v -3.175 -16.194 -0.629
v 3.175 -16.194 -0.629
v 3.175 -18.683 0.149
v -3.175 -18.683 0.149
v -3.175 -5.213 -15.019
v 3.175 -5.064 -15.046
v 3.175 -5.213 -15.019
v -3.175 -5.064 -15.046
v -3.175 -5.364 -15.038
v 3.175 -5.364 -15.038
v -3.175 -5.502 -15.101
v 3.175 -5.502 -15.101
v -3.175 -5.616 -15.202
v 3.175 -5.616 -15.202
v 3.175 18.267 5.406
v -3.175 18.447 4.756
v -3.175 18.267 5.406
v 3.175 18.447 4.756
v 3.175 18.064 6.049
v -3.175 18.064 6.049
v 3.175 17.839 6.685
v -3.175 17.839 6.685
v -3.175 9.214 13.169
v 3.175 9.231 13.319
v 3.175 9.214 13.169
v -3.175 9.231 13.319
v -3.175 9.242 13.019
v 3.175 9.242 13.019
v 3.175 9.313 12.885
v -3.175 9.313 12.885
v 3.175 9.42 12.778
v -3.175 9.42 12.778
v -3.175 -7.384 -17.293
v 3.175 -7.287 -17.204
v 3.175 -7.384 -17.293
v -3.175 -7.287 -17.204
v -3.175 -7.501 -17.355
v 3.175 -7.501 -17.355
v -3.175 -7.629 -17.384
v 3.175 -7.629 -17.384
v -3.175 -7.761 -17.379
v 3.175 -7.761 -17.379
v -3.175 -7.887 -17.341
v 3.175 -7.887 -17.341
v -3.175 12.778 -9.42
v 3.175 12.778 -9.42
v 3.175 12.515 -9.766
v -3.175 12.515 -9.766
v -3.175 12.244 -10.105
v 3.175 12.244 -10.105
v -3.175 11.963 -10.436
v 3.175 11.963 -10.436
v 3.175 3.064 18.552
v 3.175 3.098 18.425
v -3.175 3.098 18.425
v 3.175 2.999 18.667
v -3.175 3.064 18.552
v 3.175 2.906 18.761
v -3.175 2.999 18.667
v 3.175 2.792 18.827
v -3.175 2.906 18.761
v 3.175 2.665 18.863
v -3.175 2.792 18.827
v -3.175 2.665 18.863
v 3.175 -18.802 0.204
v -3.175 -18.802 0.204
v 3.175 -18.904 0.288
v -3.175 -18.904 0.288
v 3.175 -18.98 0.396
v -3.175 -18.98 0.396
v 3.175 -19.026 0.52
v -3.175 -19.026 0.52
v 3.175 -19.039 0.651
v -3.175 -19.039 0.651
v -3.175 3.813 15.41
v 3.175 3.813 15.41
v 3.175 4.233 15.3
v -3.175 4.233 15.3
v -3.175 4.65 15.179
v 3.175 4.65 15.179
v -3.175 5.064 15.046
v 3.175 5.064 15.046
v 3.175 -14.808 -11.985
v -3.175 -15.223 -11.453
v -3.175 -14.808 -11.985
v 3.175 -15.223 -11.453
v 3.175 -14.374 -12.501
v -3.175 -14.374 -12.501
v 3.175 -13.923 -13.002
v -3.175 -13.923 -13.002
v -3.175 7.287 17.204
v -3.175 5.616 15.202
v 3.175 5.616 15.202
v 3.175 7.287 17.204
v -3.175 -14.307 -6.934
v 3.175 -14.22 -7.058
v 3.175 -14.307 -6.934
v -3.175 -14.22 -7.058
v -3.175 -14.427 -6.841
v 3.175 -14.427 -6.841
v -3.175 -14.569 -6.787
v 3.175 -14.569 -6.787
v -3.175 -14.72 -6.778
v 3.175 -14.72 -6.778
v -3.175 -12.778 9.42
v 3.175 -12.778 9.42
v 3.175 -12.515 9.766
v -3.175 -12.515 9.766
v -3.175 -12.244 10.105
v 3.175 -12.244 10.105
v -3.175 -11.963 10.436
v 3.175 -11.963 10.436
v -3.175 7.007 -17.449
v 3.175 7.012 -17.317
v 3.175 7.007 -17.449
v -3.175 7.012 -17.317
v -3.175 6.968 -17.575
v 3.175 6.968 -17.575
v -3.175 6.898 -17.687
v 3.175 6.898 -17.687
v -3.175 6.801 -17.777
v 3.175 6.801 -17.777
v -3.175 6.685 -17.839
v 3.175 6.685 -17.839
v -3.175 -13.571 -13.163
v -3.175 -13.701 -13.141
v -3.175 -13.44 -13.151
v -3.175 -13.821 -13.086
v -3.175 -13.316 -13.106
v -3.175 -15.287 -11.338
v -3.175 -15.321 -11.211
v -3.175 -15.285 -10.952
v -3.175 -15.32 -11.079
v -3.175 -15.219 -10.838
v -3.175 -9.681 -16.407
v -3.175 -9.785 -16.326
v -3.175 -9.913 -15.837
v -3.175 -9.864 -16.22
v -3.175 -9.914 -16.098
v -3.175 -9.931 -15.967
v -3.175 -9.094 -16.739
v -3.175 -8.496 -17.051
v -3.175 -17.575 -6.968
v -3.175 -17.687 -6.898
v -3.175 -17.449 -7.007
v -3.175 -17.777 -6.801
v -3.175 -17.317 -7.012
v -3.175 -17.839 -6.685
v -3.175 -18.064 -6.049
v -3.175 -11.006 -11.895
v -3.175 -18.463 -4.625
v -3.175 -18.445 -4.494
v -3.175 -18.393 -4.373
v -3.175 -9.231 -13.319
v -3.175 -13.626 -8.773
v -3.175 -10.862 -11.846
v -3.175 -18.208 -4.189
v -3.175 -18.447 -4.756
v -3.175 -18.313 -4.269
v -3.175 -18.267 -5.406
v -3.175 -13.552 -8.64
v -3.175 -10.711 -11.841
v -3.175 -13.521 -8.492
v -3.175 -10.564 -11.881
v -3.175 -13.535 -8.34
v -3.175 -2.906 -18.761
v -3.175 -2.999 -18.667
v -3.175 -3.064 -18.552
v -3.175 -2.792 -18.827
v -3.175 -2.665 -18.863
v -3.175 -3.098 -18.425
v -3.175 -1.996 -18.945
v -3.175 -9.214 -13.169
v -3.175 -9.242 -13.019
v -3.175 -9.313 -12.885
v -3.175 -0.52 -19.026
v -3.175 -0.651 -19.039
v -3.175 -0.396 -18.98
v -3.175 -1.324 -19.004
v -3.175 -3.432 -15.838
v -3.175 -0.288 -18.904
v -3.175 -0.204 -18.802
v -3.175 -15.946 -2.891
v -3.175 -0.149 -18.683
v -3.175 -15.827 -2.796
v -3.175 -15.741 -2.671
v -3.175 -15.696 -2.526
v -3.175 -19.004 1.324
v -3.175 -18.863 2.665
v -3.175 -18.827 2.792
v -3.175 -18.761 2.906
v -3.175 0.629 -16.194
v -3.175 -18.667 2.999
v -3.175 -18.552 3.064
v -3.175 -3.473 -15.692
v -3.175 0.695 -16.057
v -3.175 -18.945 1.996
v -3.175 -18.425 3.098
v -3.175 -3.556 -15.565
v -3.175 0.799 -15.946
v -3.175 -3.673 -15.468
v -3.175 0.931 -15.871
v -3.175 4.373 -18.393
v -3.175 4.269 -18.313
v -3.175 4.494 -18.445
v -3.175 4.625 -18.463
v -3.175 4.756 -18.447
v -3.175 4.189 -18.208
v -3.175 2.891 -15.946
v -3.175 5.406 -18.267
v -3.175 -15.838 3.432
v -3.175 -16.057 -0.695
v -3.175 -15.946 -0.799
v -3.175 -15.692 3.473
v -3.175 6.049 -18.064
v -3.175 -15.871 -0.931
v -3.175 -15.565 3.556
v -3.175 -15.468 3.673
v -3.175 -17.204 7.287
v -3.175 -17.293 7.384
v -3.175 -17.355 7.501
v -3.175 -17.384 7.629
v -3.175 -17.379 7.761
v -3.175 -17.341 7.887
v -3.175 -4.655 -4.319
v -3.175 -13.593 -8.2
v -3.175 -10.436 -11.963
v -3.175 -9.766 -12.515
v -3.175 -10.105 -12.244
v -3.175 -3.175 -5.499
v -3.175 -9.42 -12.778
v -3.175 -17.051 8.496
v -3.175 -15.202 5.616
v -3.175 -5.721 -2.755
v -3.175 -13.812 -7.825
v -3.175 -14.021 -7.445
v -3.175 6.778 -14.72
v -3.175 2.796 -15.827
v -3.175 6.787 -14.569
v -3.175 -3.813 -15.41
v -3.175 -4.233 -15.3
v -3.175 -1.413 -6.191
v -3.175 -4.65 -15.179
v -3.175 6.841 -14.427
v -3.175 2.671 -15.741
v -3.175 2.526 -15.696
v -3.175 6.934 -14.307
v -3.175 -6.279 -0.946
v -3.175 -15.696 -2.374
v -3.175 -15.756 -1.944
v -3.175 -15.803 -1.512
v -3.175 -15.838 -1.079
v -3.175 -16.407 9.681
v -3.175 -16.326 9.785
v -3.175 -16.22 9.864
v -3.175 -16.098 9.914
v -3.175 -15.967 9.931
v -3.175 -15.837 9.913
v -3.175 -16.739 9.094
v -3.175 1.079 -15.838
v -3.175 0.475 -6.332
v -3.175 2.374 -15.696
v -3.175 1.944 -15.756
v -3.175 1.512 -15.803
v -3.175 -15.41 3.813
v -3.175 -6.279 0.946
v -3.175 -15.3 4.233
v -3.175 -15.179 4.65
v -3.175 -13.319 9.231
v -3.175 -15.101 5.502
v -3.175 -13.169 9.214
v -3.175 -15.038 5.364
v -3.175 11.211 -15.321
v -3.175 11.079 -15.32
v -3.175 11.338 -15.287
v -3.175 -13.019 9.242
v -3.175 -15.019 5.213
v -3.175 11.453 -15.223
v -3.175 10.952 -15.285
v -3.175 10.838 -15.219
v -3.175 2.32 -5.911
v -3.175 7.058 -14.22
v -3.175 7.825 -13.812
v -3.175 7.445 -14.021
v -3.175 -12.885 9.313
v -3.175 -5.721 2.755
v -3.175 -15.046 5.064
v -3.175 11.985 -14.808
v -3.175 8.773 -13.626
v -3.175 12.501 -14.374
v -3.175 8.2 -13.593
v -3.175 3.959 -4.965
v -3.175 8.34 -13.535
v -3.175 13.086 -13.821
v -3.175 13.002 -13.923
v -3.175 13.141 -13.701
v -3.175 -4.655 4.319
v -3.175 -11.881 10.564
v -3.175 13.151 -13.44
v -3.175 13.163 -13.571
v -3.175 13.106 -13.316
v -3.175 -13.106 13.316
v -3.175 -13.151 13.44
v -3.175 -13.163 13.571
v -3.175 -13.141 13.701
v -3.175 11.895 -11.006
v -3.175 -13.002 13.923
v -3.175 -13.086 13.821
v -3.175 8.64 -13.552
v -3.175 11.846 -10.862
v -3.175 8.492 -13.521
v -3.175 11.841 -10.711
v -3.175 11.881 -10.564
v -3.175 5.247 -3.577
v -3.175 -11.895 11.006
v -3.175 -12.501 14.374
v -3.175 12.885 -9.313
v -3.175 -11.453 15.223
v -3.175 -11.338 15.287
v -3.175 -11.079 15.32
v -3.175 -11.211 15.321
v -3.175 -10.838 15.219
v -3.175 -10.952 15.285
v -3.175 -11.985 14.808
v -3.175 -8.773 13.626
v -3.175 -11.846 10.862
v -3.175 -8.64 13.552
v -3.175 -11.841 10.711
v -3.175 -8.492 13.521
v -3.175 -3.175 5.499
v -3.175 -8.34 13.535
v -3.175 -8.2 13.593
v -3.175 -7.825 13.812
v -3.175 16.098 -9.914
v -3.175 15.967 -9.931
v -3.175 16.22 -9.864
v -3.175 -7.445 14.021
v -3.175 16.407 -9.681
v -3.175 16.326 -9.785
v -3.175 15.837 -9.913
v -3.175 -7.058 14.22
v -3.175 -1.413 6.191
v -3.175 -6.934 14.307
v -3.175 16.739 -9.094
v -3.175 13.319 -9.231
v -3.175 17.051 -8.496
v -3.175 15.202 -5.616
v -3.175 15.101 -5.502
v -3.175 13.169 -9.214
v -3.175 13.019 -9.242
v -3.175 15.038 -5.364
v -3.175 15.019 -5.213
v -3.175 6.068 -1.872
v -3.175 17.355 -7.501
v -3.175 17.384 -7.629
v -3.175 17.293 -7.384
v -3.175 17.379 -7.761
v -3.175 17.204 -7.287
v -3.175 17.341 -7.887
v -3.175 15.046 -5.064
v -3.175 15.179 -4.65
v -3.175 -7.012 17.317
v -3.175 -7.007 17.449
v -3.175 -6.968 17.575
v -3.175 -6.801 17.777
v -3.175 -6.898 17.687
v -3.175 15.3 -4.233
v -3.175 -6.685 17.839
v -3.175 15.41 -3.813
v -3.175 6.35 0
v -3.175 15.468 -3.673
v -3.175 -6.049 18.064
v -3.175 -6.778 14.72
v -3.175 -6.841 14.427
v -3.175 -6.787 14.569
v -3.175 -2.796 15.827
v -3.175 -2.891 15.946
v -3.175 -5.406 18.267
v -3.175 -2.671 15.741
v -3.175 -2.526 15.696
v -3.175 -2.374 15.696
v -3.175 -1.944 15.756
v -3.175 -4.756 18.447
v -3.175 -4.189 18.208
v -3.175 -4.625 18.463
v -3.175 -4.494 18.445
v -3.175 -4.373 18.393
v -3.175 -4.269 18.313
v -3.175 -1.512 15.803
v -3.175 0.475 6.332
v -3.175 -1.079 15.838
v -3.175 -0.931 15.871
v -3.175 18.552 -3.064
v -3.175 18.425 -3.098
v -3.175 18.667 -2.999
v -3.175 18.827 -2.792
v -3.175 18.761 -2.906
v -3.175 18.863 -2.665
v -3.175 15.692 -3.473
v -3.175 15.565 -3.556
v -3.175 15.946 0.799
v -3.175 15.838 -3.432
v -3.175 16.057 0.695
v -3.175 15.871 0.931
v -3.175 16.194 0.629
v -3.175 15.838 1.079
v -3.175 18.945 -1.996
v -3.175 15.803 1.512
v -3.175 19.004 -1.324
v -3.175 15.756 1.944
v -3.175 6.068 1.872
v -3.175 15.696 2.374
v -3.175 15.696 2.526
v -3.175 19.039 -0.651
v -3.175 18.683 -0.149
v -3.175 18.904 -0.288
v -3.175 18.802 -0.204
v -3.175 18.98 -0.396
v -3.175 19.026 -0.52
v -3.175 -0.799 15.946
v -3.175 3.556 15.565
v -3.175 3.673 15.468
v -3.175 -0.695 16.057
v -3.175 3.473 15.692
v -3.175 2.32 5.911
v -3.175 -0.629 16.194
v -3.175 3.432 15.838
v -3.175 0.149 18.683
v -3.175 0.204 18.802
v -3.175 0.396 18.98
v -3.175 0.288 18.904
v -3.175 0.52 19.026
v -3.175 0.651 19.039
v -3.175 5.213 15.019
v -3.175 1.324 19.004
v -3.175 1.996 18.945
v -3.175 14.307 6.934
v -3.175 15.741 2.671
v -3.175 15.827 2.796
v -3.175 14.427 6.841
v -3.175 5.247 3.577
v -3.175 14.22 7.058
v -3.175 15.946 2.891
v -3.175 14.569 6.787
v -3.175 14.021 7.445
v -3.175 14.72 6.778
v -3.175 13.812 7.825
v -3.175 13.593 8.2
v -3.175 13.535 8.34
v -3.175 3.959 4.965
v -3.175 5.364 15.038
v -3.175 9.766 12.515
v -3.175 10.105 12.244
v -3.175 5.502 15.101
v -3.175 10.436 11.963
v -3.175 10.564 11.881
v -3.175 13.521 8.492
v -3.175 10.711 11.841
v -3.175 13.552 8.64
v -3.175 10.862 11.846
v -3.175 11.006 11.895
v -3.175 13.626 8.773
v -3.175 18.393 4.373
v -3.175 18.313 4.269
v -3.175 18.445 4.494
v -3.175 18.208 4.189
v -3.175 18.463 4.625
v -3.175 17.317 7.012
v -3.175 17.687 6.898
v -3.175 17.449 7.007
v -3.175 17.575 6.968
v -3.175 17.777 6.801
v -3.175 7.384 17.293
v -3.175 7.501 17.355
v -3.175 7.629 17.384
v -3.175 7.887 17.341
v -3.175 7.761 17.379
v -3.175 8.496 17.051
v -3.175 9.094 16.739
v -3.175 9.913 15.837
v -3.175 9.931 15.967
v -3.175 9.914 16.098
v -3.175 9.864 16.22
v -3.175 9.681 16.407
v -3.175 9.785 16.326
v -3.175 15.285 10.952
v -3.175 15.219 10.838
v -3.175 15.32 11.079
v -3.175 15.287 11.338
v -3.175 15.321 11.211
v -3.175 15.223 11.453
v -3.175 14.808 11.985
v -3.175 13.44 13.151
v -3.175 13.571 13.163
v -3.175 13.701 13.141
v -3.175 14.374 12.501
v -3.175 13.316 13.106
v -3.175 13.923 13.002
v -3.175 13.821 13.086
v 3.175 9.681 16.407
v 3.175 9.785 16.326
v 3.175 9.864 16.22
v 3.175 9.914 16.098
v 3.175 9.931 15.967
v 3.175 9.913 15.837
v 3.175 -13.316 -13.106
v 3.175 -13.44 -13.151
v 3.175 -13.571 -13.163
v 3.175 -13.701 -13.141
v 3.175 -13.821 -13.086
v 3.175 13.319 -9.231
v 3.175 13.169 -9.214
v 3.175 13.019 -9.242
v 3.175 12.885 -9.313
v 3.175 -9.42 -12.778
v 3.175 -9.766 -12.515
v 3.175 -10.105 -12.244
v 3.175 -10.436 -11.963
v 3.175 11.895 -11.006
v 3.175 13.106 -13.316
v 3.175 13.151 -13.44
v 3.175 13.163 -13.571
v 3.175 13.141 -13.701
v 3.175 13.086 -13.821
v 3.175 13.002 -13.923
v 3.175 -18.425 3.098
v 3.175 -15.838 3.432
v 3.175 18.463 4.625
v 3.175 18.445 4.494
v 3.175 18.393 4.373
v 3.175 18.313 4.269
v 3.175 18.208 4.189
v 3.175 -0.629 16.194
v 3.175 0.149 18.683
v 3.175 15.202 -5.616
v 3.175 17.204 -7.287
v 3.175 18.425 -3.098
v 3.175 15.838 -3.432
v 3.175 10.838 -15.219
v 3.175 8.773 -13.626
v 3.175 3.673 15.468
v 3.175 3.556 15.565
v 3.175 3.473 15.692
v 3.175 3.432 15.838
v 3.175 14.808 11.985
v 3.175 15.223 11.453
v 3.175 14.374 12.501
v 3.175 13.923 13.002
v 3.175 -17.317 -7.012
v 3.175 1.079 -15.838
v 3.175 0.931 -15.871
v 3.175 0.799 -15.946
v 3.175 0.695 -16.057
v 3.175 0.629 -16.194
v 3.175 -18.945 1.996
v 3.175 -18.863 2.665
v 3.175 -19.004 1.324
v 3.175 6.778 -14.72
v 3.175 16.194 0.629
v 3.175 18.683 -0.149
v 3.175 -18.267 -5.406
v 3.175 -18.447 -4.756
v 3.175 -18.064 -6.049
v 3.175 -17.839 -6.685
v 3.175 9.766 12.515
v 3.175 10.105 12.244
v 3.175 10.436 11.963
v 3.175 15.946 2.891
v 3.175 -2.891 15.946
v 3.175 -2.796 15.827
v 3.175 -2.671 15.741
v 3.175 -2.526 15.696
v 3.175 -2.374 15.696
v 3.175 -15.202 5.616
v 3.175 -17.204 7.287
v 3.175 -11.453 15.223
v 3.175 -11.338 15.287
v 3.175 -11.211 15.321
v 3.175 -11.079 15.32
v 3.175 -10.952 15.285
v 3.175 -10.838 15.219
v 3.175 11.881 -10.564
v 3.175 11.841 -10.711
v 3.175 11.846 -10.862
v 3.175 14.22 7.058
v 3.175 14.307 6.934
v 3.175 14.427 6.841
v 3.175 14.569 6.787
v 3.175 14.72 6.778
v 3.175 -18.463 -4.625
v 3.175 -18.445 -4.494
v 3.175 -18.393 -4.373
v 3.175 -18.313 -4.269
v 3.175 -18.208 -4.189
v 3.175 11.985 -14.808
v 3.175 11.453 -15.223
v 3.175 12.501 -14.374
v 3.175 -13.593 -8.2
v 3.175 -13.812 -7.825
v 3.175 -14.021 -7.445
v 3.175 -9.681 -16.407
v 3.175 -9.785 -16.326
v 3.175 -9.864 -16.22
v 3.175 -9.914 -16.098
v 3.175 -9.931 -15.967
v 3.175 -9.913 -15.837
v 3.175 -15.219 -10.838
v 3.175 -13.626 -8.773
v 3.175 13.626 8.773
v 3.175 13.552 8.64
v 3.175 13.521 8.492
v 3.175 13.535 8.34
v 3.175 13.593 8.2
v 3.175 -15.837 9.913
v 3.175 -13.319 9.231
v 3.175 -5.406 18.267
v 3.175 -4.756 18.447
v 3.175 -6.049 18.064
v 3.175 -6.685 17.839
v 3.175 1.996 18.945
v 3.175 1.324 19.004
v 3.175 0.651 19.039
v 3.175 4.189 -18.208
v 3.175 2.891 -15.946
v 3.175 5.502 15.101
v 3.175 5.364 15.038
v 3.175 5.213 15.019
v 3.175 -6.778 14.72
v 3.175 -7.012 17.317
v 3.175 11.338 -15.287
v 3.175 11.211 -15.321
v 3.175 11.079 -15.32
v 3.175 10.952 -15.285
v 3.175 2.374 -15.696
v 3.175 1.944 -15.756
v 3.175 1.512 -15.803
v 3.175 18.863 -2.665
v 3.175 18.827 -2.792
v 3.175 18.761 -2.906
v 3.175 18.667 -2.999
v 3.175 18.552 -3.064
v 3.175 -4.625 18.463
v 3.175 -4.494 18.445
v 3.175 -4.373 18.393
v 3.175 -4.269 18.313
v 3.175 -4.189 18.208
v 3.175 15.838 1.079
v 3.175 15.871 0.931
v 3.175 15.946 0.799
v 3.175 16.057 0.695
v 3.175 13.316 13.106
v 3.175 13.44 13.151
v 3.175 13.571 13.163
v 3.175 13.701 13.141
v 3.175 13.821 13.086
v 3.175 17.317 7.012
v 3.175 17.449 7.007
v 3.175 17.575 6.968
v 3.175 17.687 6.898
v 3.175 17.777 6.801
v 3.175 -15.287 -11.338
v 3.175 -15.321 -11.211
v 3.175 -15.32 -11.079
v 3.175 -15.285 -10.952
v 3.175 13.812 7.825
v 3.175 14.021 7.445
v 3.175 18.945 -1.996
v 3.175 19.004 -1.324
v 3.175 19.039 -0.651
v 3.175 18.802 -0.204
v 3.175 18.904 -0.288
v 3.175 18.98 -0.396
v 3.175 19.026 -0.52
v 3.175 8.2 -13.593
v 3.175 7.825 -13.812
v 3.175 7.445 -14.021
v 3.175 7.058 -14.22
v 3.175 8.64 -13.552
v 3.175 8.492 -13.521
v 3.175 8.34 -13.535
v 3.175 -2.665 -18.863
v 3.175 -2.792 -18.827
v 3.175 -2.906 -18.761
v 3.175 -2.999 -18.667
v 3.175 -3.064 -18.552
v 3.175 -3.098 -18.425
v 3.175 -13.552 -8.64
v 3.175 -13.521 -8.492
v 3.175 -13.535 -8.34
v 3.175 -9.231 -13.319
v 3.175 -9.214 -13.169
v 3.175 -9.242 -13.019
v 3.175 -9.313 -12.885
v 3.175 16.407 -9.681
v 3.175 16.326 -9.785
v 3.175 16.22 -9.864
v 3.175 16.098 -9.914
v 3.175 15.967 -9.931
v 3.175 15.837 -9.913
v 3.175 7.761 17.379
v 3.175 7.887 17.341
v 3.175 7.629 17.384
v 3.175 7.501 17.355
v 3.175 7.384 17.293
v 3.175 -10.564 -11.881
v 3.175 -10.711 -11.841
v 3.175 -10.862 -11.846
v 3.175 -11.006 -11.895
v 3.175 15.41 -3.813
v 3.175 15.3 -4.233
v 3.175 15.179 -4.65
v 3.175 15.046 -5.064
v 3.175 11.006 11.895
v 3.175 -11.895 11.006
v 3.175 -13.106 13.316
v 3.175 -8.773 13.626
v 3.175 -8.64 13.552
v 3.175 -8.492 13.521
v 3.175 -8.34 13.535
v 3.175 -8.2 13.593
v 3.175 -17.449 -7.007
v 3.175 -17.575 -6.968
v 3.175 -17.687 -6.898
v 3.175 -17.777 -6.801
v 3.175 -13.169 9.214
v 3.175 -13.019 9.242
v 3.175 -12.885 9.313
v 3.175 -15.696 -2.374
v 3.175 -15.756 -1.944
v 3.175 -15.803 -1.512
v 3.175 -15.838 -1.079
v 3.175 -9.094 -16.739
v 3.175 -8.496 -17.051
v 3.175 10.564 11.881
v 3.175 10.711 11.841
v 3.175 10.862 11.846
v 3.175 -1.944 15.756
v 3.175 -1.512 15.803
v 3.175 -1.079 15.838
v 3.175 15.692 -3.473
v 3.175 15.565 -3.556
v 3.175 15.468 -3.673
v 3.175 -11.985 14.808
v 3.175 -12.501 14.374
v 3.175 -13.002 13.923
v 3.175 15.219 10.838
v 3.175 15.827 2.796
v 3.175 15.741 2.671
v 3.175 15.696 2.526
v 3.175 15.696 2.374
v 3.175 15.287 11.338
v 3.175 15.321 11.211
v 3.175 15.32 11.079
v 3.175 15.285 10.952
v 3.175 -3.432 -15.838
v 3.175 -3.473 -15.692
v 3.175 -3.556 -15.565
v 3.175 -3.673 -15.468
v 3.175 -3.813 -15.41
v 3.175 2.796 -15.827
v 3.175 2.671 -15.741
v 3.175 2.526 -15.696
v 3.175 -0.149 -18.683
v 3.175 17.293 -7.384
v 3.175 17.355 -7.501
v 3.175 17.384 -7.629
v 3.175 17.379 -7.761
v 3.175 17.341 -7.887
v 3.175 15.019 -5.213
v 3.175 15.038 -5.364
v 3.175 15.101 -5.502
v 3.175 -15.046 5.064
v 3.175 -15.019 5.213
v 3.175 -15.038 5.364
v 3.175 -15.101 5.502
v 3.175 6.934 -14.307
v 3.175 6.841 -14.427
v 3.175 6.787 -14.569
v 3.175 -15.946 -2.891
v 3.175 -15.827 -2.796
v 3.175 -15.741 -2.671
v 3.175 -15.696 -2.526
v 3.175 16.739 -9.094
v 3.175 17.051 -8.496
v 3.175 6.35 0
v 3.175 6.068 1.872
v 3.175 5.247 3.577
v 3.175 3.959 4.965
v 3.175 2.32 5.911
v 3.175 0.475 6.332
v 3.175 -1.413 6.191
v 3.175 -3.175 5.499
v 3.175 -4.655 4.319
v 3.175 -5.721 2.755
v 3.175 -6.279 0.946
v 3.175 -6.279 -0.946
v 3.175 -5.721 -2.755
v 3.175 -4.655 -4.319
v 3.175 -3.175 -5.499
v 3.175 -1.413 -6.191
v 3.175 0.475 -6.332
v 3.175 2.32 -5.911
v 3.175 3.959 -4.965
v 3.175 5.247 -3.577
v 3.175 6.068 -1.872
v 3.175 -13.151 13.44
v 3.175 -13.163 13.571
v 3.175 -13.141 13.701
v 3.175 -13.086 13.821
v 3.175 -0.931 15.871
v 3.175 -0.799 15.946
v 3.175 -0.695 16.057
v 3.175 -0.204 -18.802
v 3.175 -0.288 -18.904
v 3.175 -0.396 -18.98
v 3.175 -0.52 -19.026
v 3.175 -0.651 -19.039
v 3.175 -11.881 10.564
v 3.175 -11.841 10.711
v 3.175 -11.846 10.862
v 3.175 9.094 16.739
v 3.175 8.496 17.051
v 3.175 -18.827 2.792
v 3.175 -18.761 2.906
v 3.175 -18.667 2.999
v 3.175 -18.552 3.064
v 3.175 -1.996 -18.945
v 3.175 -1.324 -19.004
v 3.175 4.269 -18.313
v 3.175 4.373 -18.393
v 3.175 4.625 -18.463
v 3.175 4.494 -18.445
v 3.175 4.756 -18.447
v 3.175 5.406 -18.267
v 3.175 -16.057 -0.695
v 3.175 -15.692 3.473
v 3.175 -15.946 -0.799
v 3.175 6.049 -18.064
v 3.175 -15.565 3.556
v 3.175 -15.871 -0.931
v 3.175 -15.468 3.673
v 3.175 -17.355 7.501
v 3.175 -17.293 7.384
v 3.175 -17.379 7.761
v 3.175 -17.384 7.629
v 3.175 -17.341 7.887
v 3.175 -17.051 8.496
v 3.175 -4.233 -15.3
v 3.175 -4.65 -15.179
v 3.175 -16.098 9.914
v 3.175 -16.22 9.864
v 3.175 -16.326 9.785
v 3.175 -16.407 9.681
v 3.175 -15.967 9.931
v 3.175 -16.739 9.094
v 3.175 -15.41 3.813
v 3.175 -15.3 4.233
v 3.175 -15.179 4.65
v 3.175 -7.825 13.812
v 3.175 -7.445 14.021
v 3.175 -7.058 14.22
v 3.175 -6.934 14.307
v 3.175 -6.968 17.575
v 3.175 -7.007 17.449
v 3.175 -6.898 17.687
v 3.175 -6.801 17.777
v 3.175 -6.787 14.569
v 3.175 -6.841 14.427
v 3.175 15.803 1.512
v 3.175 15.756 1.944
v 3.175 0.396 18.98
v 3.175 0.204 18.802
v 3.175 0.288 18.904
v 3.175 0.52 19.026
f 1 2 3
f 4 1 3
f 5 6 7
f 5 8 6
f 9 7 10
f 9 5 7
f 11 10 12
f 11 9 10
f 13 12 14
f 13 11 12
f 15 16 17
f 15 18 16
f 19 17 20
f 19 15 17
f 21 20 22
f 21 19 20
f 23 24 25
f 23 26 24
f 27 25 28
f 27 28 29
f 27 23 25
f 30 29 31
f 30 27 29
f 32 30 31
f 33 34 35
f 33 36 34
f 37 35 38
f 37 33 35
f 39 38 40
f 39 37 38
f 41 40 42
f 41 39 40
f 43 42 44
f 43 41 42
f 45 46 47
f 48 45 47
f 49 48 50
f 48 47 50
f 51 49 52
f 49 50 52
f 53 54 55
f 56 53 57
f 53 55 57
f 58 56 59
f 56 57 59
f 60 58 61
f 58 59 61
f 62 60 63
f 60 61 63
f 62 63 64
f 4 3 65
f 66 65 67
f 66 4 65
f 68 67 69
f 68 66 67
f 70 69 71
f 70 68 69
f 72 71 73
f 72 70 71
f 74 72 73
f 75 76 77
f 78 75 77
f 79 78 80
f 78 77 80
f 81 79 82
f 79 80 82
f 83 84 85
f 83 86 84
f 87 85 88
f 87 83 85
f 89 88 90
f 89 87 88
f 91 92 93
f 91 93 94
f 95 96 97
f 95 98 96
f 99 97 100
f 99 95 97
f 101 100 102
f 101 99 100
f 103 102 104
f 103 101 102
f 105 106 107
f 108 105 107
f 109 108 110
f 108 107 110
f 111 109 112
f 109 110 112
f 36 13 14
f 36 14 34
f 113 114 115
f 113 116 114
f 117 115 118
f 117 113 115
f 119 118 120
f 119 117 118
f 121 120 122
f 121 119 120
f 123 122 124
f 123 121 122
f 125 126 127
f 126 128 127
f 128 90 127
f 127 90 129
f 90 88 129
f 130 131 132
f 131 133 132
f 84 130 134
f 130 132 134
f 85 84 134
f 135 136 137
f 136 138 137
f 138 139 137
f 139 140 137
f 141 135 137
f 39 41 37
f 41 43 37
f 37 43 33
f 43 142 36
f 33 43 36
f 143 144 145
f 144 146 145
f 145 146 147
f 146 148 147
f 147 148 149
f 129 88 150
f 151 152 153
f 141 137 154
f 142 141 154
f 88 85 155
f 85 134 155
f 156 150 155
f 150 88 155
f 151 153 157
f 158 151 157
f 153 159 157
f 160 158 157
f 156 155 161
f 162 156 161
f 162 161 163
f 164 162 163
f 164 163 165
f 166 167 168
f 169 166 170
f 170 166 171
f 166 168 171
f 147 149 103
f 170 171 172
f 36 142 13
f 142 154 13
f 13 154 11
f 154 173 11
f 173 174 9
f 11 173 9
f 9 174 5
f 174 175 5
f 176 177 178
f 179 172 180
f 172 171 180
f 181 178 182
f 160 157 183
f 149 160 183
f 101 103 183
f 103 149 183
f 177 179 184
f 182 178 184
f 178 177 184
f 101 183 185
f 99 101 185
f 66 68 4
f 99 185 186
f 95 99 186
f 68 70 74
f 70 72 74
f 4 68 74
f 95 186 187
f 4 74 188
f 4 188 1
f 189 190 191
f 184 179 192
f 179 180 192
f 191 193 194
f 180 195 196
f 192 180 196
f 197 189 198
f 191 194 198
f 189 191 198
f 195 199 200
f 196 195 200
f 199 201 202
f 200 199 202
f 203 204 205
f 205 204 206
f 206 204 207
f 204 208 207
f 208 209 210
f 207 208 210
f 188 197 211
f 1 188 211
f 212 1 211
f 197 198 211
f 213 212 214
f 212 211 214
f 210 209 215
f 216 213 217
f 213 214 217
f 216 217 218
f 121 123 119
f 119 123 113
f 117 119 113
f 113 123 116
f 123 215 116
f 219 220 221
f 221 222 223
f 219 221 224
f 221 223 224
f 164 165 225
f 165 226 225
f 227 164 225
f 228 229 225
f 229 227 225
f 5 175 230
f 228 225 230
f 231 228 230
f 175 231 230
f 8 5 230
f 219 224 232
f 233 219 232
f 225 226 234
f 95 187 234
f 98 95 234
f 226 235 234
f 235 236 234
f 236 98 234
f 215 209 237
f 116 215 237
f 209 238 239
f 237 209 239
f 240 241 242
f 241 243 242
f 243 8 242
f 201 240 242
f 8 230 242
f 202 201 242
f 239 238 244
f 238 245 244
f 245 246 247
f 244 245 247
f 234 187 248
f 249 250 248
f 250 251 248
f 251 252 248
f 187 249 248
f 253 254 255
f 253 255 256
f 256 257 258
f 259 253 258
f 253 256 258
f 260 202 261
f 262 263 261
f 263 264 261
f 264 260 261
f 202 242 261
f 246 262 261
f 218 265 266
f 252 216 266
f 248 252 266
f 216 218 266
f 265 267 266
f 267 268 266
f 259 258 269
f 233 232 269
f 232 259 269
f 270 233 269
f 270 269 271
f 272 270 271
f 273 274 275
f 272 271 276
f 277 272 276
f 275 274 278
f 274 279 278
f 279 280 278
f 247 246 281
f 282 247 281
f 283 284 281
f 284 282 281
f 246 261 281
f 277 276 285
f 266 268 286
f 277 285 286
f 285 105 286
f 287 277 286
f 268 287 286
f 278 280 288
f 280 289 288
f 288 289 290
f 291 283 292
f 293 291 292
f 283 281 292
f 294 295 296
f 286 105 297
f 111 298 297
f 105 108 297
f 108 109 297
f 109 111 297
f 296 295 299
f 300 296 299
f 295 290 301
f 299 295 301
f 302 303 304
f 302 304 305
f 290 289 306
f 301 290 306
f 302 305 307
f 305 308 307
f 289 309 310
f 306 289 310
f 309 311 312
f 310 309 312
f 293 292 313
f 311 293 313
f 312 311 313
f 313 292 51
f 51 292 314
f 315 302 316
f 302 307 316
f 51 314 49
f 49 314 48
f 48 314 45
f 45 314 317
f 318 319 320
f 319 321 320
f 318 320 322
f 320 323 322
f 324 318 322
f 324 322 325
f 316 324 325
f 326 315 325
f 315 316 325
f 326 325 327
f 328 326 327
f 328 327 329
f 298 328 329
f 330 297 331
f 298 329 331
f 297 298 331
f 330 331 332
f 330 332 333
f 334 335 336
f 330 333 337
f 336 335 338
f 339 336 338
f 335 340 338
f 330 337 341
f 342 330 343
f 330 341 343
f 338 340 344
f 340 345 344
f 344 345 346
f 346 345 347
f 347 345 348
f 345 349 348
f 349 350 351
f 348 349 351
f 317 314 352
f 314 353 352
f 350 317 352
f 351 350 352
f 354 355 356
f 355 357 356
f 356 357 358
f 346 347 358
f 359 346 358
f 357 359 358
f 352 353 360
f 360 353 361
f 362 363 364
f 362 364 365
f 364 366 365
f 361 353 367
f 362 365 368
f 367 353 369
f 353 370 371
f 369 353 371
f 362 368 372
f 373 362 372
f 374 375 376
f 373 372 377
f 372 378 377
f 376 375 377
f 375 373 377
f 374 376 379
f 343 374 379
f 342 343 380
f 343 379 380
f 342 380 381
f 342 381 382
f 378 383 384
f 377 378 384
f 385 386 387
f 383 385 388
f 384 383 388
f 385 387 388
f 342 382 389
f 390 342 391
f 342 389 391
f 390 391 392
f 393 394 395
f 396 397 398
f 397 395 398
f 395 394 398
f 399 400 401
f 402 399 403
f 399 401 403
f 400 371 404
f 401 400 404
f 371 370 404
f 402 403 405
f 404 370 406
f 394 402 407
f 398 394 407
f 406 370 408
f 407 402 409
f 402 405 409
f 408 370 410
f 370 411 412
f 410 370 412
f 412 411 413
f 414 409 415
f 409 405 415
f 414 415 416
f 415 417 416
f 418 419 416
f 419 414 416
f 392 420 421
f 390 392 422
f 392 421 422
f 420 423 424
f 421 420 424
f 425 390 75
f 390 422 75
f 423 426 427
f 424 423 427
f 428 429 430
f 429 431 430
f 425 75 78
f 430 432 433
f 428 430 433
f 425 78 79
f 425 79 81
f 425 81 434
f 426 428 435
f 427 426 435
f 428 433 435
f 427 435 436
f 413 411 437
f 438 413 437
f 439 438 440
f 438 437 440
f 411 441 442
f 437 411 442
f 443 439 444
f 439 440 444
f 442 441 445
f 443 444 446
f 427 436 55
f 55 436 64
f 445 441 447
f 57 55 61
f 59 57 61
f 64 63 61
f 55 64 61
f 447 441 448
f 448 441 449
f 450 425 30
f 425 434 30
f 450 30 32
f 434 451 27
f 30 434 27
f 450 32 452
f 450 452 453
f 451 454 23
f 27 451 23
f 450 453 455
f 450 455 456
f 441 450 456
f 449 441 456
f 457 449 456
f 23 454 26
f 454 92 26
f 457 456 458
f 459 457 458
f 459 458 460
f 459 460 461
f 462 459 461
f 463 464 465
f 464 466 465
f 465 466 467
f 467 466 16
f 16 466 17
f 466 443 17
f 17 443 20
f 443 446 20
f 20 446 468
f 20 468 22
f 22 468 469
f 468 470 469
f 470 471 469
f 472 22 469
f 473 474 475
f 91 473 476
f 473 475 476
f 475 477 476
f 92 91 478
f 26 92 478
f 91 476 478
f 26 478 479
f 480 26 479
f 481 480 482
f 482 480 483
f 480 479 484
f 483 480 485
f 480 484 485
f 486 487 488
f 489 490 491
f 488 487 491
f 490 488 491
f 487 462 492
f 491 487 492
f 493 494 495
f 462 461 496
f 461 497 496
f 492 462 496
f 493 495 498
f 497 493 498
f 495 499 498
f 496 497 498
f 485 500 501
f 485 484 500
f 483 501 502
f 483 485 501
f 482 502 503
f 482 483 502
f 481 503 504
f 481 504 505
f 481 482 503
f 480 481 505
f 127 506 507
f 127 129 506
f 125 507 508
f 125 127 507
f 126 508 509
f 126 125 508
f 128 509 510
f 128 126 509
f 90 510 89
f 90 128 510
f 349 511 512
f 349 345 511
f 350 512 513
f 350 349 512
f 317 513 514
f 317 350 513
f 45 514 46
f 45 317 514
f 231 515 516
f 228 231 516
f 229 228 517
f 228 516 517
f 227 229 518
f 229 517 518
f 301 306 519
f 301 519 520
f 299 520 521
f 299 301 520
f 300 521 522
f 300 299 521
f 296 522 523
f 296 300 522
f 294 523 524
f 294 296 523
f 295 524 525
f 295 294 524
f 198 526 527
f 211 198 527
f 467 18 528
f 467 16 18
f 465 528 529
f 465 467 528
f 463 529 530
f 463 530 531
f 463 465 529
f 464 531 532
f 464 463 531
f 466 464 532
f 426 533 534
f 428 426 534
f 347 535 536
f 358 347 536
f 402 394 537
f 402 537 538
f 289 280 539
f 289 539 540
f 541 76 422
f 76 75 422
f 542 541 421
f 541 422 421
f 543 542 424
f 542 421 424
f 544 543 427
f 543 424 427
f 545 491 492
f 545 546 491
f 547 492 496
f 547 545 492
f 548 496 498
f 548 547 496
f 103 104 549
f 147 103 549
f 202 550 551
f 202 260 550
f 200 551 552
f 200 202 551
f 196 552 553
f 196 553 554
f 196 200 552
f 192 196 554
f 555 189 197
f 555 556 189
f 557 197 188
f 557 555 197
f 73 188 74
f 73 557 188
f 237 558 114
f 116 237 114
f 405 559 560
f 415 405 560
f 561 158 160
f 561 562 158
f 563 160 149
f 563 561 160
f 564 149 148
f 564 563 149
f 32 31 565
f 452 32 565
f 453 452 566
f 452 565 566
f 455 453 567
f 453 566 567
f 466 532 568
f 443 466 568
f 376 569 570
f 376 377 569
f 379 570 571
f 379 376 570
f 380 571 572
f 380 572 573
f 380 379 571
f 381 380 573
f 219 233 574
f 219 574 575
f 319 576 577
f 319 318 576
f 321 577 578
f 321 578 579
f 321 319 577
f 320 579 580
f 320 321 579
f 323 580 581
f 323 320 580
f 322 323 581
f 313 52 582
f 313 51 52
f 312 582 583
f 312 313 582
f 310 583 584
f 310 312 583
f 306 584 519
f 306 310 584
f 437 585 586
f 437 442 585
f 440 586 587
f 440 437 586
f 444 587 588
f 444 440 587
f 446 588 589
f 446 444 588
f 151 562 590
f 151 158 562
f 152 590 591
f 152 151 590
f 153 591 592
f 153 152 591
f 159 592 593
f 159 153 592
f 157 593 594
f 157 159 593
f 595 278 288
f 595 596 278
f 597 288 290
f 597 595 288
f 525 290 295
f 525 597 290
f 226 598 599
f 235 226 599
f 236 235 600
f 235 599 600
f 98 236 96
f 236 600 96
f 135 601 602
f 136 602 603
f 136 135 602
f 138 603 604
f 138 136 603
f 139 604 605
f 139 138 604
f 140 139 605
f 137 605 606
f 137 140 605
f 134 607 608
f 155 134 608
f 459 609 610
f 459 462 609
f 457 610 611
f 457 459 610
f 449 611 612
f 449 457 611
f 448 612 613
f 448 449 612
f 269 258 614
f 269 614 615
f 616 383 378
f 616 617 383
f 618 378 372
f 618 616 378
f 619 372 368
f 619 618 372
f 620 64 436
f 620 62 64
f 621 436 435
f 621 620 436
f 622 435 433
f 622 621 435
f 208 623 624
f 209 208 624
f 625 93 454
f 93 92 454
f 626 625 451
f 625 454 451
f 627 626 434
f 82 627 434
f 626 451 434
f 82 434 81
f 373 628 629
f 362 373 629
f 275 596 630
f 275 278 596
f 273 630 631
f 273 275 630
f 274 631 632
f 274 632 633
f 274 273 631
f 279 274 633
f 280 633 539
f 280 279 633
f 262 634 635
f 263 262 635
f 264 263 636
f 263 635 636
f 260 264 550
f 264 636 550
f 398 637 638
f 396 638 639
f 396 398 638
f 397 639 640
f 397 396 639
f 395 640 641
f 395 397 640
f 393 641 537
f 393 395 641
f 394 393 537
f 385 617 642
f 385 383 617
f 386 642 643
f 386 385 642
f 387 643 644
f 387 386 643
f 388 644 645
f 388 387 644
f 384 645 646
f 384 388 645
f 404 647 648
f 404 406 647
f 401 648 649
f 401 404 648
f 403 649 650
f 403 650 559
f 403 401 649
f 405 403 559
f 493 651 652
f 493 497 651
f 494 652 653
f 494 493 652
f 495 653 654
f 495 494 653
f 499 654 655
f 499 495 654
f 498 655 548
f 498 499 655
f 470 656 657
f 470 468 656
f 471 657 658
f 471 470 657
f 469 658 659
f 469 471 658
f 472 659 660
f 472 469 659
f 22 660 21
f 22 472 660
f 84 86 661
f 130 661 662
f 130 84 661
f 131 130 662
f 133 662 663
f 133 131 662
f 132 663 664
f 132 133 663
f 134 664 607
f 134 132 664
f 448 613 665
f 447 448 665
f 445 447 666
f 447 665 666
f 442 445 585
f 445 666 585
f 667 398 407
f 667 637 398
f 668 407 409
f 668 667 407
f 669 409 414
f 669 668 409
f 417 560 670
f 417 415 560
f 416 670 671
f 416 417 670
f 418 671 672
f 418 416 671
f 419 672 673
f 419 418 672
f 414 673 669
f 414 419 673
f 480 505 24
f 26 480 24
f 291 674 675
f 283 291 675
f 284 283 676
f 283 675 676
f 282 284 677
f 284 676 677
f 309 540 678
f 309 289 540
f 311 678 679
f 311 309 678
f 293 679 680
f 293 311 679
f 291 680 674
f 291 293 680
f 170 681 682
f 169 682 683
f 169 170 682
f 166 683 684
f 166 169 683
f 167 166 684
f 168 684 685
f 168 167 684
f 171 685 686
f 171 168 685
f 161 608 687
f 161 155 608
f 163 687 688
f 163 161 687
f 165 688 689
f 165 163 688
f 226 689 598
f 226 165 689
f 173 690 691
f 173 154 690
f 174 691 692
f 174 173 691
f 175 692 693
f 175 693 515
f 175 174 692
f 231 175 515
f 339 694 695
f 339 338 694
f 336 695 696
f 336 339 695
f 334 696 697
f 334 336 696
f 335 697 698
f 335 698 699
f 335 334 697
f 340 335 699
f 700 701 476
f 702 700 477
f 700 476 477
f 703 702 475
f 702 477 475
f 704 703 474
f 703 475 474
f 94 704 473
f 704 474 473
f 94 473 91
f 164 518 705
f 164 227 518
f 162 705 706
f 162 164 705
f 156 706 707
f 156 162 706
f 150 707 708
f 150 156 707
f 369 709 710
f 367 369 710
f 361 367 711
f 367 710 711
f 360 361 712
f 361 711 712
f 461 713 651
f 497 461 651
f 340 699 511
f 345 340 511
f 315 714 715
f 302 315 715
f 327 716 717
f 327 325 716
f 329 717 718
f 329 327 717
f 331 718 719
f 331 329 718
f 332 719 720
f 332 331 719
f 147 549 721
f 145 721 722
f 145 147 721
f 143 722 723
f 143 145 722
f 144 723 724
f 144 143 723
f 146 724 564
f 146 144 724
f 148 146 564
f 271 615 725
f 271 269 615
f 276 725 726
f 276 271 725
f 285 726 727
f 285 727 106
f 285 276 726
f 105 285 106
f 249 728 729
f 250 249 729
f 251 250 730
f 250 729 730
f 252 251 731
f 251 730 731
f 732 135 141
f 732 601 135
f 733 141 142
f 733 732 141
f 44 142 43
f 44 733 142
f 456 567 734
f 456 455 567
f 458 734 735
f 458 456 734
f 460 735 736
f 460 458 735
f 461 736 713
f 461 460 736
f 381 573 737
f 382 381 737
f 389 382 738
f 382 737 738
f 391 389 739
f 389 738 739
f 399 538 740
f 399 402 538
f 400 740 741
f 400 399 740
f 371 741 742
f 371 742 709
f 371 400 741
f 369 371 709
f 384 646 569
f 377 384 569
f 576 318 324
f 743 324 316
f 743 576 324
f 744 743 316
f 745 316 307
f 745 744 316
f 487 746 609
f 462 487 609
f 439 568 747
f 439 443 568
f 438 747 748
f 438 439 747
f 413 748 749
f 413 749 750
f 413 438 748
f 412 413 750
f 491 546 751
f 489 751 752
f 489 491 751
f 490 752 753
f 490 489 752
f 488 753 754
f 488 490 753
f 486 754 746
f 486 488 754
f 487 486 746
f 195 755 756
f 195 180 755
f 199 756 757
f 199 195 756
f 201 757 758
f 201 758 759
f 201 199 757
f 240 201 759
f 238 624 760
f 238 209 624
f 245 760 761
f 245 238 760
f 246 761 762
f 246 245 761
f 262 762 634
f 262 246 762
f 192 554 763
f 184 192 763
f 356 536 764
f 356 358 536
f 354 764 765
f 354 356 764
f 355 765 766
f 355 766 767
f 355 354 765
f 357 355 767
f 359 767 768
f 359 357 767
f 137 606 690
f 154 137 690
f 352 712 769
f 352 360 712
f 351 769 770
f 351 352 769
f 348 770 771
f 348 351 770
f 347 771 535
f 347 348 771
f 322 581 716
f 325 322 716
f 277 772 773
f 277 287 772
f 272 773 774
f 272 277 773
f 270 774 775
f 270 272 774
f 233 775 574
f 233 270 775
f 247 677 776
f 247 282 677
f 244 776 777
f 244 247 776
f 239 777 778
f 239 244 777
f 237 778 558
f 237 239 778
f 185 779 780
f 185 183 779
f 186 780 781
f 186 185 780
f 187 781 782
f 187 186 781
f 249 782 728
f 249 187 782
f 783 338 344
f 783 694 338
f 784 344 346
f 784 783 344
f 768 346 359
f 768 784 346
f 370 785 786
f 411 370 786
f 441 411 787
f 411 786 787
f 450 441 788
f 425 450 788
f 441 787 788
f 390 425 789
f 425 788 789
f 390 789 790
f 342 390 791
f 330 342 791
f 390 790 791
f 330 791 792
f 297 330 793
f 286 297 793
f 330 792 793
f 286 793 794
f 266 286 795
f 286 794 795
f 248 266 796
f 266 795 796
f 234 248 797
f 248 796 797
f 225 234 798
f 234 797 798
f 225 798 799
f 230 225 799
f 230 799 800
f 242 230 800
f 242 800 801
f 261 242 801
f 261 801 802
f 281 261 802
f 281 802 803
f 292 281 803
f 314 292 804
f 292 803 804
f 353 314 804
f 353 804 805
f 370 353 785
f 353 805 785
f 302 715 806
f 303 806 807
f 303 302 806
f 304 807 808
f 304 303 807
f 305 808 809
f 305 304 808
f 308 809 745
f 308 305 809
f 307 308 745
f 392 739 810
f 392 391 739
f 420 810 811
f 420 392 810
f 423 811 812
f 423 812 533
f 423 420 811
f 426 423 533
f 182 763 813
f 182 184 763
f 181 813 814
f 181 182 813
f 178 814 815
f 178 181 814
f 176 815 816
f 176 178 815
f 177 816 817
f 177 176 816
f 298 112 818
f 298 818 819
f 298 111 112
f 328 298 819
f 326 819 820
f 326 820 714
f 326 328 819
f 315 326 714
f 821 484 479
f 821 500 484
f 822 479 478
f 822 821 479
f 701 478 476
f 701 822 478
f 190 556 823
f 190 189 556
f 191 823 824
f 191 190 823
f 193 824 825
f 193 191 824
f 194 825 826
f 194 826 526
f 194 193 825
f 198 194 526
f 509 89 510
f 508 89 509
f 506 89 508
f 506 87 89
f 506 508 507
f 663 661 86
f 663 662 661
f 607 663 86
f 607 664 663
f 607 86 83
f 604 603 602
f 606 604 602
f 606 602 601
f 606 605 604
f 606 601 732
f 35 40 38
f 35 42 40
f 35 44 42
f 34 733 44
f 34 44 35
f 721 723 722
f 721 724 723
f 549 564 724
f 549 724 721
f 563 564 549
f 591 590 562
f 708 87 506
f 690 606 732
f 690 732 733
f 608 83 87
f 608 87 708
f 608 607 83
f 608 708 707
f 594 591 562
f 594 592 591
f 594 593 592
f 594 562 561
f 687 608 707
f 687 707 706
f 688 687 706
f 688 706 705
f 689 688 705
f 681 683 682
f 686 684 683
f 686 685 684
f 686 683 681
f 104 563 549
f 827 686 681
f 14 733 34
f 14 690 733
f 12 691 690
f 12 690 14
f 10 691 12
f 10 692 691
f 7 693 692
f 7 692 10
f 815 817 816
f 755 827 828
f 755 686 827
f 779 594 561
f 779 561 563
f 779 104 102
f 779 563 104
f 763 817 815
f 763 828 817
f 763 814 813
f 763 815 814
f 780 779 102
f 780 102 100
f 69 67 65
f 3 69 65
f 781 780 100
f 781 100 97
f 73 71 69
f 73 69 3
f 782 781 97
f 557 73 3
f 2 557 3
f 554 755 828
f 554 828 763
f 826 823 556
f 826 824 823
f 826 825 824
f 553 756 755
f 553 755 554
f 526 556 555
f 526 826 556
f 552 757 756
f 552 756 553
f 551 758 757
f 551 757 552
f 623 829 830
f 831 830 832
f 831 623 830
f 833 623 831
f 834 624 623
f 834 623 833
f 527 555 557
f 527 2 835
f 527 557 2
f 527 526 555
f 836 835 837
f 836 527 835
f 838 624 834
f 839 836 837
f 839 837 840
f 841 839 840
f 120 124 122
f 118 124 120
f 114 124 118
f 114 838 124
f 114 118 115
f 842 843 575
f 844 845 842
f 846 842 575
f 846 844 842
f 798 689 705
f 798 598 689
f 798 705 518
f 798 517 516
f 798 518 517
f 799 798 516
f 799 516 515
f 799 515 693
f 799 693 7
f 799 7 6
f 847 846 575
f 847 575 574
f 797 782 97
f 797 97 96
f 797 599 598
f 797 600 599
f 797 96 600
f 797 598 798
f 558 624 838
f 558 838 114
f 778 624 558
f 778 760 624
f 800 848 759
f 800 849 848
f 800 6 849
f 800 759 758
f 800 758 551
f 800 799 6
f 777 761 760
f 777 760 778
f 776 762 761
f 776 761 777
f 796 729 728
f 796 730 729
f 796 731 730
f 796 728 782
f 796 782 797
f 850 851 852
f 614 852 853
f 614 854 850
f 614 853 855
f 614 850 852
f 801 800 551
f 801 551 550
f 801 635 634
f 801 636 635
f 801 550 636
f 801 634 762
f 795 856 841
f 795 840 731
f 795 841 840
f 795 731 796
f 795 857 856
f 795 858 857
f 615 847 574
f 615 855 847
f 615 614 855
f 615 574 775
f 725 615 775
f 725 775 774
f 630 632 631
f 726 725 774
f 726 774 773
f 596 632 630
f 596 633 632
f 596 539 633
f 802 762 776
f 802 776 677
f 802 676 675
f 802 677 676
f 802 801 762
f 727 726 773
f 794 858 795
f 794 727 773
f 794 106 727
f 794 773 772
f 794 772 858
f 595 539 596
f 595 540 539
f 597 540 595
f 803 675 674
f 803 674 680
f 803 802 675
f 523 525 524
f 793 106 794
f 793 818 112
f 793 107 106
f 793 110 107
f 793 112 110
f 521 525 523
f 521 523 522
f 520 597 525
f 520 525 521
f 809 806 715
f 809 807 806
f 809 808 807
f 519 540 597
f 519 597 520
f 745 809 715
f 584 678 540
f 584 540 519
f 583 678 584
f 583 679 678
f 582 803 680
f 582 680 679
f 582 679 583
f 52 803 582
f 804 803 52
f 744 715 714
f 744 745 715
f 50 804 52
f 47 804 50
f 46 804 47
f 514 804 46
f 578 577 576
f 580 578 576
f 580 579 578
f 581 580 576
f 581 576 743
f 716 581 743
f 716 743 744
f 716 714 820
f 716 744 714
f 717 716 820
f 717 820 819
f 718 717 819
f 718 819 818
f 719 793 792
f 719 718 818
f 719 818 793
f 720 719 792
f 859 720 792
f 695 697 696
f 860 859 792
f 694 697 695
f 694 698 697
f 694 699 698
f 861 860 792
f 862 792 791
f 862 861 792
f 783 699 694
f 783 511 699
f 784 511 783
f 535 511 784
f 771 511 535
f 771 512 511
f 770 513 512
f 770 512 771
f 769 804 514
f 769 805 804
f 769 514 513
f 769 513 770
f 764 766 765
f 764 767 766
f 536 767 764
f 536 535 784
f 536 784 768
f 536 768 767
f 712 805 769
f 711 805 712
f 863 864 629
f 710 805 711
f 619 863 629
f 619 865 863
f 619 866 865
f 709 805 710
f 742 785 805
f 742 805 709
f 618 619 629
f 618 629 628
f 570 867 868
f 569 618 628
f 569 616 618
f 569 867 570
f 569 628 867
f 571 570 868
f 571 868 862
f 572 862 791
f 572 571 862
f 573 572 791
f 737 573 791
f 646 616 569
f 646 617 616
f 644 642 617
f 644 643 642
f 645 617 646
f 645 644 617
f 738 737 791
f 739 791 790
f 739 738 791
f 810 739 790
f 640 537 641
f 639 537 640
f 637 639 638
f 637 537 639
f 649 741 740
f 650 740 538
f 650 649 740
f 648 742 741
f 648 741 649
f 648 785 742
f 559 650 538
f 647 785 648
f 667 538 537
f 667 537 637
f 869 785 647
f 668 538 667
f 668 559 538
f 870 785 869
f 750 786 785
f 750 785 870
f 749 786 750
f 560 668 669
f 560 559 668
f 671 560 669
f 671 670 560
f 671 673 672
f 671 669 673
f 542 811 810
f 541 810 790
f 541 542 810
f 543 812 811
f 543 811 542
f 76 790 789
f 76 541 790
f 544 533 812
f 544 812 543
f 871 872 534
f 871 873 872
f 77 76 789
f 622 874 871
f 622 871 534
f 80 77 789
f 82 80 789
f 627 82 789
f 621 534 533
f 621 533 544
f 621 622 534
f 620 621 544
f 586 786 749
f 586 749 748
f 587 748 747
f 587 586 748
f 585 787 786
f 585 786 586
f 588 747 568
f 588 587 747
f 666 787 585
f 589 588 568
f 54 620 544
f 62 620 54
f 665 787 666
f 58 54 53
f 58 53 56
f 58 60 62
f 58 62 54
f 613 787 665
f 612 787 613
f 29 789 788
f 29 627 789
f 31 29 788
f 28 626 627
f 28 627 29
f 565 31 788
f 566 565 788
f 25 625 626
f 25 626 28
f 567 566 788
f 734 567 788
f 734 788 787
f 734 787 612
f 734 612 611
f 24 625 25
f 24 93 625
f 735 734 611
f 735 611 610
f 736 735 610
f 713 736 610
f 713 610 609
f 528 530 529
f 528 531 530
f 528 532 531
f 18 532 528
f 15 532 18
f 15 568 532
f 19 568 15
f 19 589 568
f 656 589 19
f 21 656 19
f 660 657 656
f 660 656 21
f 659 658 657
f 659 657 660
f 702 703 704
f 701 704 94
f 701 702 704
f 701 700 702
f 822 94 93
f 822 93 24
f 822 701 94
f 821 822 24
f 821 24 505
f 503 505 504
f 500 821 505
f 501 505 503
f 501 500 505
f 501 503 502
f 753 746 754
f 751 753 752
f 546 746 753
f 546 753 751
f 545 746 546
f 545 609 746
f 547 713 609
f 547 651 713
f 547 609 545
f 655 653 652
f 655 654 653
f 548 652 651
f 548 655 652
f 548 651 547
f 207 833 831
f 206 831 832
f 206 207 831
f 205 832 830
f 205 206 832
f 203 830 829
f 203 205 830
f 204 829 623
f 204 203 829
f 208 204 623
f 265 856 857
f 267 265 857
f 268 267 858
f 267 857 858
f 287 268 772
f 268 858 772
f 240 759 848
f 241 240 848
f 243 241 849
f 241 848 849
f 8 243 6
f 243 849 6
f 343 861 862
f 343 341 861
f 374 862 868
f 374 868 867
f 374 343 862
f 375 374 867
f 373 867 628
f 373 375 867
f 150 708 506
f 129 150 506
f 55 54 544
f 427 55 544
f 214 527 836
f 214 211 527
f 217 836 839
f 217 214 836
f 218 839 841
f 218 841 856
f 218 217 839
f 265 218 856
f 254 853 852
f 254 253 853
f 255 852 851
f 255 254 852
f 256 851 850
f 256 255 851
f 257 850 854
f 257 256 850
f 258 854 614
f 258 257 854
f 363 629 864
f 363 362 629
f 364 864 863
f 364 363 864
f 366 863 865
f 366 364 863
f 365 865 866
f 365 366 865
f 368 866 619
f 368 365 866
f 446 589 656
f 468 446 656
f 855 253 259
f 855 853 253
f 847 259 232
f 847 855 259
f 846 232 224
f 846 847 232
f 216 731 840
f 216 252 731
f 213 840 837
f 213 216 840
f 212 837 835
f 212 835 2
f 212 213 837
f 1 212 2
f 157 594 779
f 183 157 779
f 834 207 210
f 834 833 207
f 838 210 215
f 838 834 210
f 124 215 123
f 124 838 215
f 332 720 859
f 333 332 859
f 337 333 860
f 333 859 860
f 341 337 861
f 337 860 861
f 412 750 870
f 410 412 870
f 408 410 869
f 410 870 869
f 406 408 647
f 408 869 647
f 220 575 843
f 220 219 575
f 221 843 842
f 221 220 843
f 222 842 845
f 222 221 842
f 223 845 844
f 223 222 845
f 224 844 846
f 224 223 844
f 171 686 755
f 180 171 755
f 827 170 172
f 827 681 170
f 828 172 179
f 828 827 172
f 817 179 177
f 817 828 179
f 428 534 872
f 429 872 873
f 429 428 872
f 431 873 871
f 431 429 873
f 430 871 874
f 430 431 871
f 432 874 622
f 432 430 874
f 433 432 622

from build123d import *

# Parameters (mm, degrees)
F0_R            = 19.05
F1_DEPTH        = 3.175
F3_DEPTH        = 6.35
F3_COPIES_COUNT = 16
F4_R            = 0.508
F5_R            = 6.35
F6_DEPTH        = 6.35


# Not quite as in the source:
# - a pattern or mirror of a feature is missing from the dataset's text; its kind, count and spacing are read off the source's solid


with BuildPart() as f1:
    # F0 (on Right) → F1 (new body, symmetric)
    with BuildSketch(Plane.YZ):
        Circle(F0_R)
    extrude(amount=F1_DEPTH, both=True)

    # F2 (on face) → F3 (cut, through all)
    with BuildSketch(Plane.YZ.offset(3.175)):
        with BuildLine():
            ThreePointArc((7.5322043505, 17.4976683482), (5.7520331342, 19.7340330411), (3.0490465261, 18.8044094638))
            Line((3.0490465261, 18.8044094638), (3.4766055202, 15.489636505))
            ThreePointArc((3.4766055202, 15.489636505), (4.4423475568, 15.2407733788), (5.3905576771, 14.931761883))
            Line((5.3905576771, 14.931761883), (7.5322043505, 17.4976683482))
        make_face()
    f3 = extrude(amount=-F3_DEPTH, mode=Mode.SUBTRACT)

    # F3_copies: F3 ×16 about axis
    f3_copies_axis = Axis((0, 0, 0), (1, 0, 0))
    for i in range(1, F3_COPIES_COUNT):
        add(f3.rotate(f3_copies_axis, i * 360 / F3_COPIES_COUNT), mode=Mode.SUBTRACT)

    # F4
    f4_edges = [f1.edges().sort_by_distance(p)[0] for p in [
        (0, 3.476606, 15.489637),
        (0, 5.390558, 14.931762),
        (0, 3.049047, 18.804409),
        (0, 7.532204, 17.497668),
        (0, 10.013088, 16.206189),
        (0, 9.139592, 12.980119),
        (0, 10.694364, 11.732272),
        (0, 13.654917, 13.283288),
        (0, 15.452727, 11.140724),
        (0, 13.411158, 8.494496),
        (0, 14.37005, 6.74665),
        (0, 17.698793, 7.046647),
        (0, 18.539829, 4.379184),
        (0, 15.640997, 2.715663),
        (0, 15.858026, 0.733912),
        (0, 19.048187, -0.262782),
        (0, 18.804409, -3.049047),
        (0, 15.489637, -3.476606),
        (0, 14.931762, -5.390558),
        (0, 17.497668, -7.532204),
        (0, 16.206189, -10.013088),
        (0, 12.980119, -9.139592),
        (0, 11.732272, -10.694364),
        (0, 13.283288, -13.654917),
        (0, 11.140724, -15.452727),
        (0, 8.494496, -13.411158),
        (0, 6.74665, -14.37005),
        (0, 7.046647, -17.698793),
        (0, 4.379184, -18.539829),
        (0, 2.715663, -15.640997),
        (0, 0.733912, -15.858026),
        (0, -0.262782, -19.048187),
        (0, -3.049047, -18.804409),
        (0, -3.476606, -15.489637),
        (0, -5.390558, -14.931762),
        (0, -7.532204, -17.497668),
        (0, -10.013088, -16.206189),
        (0, -9.139592, -12.980119),
        (0, -10.694364, -11.732272),
        (0, -13.654917, -13.283288),
        (0, -15.452727, -11.140724),
        (0, -13.411158, -8.494496),
        (0, -14.37005, -6.74665),
        (0, -17.698793, -7.046647),
        (0, -18.539829, -4.379184),
        (0, -15.640997, -2.715663),
        (0, -15.858026, -0.733912),
        (0, -19.048187, 0.262782),
        (0, -18.804409, 3.049047),
        (0, -15.489637, 3.476606),
        (0, -14.931762, 5.390558),
        (0, -17.497668, 7.532204),
        (0, -16.206189, 10.013088),
        (0, -12.980119, 9.139592),
        (0, -11.732272, 10.694364),
        (0, -13.283288, 13.654917),
        (0, -11.140724, 15.452727),
        (0, -8.494496, 13.411158),
        (0, -6.74665, 14.37005),
        (0, -7.046647, 17.698793),
        (0, -4.379184, 18.539829),
        (0, -2.715663, 15.640997),
        (0, -0.733912, 15.858026),
        (0, 0.262782, 19.048187),
    ]]
    fillet(f4_edges, radius=F4_R)

    # F5 (on face) → F6 (cut, through all)
    with BuildSketch(Plane.YZ.offset(3.175)):
        Circle(F5_R)
    extrude(amount=-F6_DEPTH, mode=Mode.SUBTRACT)


solid = f1.part
